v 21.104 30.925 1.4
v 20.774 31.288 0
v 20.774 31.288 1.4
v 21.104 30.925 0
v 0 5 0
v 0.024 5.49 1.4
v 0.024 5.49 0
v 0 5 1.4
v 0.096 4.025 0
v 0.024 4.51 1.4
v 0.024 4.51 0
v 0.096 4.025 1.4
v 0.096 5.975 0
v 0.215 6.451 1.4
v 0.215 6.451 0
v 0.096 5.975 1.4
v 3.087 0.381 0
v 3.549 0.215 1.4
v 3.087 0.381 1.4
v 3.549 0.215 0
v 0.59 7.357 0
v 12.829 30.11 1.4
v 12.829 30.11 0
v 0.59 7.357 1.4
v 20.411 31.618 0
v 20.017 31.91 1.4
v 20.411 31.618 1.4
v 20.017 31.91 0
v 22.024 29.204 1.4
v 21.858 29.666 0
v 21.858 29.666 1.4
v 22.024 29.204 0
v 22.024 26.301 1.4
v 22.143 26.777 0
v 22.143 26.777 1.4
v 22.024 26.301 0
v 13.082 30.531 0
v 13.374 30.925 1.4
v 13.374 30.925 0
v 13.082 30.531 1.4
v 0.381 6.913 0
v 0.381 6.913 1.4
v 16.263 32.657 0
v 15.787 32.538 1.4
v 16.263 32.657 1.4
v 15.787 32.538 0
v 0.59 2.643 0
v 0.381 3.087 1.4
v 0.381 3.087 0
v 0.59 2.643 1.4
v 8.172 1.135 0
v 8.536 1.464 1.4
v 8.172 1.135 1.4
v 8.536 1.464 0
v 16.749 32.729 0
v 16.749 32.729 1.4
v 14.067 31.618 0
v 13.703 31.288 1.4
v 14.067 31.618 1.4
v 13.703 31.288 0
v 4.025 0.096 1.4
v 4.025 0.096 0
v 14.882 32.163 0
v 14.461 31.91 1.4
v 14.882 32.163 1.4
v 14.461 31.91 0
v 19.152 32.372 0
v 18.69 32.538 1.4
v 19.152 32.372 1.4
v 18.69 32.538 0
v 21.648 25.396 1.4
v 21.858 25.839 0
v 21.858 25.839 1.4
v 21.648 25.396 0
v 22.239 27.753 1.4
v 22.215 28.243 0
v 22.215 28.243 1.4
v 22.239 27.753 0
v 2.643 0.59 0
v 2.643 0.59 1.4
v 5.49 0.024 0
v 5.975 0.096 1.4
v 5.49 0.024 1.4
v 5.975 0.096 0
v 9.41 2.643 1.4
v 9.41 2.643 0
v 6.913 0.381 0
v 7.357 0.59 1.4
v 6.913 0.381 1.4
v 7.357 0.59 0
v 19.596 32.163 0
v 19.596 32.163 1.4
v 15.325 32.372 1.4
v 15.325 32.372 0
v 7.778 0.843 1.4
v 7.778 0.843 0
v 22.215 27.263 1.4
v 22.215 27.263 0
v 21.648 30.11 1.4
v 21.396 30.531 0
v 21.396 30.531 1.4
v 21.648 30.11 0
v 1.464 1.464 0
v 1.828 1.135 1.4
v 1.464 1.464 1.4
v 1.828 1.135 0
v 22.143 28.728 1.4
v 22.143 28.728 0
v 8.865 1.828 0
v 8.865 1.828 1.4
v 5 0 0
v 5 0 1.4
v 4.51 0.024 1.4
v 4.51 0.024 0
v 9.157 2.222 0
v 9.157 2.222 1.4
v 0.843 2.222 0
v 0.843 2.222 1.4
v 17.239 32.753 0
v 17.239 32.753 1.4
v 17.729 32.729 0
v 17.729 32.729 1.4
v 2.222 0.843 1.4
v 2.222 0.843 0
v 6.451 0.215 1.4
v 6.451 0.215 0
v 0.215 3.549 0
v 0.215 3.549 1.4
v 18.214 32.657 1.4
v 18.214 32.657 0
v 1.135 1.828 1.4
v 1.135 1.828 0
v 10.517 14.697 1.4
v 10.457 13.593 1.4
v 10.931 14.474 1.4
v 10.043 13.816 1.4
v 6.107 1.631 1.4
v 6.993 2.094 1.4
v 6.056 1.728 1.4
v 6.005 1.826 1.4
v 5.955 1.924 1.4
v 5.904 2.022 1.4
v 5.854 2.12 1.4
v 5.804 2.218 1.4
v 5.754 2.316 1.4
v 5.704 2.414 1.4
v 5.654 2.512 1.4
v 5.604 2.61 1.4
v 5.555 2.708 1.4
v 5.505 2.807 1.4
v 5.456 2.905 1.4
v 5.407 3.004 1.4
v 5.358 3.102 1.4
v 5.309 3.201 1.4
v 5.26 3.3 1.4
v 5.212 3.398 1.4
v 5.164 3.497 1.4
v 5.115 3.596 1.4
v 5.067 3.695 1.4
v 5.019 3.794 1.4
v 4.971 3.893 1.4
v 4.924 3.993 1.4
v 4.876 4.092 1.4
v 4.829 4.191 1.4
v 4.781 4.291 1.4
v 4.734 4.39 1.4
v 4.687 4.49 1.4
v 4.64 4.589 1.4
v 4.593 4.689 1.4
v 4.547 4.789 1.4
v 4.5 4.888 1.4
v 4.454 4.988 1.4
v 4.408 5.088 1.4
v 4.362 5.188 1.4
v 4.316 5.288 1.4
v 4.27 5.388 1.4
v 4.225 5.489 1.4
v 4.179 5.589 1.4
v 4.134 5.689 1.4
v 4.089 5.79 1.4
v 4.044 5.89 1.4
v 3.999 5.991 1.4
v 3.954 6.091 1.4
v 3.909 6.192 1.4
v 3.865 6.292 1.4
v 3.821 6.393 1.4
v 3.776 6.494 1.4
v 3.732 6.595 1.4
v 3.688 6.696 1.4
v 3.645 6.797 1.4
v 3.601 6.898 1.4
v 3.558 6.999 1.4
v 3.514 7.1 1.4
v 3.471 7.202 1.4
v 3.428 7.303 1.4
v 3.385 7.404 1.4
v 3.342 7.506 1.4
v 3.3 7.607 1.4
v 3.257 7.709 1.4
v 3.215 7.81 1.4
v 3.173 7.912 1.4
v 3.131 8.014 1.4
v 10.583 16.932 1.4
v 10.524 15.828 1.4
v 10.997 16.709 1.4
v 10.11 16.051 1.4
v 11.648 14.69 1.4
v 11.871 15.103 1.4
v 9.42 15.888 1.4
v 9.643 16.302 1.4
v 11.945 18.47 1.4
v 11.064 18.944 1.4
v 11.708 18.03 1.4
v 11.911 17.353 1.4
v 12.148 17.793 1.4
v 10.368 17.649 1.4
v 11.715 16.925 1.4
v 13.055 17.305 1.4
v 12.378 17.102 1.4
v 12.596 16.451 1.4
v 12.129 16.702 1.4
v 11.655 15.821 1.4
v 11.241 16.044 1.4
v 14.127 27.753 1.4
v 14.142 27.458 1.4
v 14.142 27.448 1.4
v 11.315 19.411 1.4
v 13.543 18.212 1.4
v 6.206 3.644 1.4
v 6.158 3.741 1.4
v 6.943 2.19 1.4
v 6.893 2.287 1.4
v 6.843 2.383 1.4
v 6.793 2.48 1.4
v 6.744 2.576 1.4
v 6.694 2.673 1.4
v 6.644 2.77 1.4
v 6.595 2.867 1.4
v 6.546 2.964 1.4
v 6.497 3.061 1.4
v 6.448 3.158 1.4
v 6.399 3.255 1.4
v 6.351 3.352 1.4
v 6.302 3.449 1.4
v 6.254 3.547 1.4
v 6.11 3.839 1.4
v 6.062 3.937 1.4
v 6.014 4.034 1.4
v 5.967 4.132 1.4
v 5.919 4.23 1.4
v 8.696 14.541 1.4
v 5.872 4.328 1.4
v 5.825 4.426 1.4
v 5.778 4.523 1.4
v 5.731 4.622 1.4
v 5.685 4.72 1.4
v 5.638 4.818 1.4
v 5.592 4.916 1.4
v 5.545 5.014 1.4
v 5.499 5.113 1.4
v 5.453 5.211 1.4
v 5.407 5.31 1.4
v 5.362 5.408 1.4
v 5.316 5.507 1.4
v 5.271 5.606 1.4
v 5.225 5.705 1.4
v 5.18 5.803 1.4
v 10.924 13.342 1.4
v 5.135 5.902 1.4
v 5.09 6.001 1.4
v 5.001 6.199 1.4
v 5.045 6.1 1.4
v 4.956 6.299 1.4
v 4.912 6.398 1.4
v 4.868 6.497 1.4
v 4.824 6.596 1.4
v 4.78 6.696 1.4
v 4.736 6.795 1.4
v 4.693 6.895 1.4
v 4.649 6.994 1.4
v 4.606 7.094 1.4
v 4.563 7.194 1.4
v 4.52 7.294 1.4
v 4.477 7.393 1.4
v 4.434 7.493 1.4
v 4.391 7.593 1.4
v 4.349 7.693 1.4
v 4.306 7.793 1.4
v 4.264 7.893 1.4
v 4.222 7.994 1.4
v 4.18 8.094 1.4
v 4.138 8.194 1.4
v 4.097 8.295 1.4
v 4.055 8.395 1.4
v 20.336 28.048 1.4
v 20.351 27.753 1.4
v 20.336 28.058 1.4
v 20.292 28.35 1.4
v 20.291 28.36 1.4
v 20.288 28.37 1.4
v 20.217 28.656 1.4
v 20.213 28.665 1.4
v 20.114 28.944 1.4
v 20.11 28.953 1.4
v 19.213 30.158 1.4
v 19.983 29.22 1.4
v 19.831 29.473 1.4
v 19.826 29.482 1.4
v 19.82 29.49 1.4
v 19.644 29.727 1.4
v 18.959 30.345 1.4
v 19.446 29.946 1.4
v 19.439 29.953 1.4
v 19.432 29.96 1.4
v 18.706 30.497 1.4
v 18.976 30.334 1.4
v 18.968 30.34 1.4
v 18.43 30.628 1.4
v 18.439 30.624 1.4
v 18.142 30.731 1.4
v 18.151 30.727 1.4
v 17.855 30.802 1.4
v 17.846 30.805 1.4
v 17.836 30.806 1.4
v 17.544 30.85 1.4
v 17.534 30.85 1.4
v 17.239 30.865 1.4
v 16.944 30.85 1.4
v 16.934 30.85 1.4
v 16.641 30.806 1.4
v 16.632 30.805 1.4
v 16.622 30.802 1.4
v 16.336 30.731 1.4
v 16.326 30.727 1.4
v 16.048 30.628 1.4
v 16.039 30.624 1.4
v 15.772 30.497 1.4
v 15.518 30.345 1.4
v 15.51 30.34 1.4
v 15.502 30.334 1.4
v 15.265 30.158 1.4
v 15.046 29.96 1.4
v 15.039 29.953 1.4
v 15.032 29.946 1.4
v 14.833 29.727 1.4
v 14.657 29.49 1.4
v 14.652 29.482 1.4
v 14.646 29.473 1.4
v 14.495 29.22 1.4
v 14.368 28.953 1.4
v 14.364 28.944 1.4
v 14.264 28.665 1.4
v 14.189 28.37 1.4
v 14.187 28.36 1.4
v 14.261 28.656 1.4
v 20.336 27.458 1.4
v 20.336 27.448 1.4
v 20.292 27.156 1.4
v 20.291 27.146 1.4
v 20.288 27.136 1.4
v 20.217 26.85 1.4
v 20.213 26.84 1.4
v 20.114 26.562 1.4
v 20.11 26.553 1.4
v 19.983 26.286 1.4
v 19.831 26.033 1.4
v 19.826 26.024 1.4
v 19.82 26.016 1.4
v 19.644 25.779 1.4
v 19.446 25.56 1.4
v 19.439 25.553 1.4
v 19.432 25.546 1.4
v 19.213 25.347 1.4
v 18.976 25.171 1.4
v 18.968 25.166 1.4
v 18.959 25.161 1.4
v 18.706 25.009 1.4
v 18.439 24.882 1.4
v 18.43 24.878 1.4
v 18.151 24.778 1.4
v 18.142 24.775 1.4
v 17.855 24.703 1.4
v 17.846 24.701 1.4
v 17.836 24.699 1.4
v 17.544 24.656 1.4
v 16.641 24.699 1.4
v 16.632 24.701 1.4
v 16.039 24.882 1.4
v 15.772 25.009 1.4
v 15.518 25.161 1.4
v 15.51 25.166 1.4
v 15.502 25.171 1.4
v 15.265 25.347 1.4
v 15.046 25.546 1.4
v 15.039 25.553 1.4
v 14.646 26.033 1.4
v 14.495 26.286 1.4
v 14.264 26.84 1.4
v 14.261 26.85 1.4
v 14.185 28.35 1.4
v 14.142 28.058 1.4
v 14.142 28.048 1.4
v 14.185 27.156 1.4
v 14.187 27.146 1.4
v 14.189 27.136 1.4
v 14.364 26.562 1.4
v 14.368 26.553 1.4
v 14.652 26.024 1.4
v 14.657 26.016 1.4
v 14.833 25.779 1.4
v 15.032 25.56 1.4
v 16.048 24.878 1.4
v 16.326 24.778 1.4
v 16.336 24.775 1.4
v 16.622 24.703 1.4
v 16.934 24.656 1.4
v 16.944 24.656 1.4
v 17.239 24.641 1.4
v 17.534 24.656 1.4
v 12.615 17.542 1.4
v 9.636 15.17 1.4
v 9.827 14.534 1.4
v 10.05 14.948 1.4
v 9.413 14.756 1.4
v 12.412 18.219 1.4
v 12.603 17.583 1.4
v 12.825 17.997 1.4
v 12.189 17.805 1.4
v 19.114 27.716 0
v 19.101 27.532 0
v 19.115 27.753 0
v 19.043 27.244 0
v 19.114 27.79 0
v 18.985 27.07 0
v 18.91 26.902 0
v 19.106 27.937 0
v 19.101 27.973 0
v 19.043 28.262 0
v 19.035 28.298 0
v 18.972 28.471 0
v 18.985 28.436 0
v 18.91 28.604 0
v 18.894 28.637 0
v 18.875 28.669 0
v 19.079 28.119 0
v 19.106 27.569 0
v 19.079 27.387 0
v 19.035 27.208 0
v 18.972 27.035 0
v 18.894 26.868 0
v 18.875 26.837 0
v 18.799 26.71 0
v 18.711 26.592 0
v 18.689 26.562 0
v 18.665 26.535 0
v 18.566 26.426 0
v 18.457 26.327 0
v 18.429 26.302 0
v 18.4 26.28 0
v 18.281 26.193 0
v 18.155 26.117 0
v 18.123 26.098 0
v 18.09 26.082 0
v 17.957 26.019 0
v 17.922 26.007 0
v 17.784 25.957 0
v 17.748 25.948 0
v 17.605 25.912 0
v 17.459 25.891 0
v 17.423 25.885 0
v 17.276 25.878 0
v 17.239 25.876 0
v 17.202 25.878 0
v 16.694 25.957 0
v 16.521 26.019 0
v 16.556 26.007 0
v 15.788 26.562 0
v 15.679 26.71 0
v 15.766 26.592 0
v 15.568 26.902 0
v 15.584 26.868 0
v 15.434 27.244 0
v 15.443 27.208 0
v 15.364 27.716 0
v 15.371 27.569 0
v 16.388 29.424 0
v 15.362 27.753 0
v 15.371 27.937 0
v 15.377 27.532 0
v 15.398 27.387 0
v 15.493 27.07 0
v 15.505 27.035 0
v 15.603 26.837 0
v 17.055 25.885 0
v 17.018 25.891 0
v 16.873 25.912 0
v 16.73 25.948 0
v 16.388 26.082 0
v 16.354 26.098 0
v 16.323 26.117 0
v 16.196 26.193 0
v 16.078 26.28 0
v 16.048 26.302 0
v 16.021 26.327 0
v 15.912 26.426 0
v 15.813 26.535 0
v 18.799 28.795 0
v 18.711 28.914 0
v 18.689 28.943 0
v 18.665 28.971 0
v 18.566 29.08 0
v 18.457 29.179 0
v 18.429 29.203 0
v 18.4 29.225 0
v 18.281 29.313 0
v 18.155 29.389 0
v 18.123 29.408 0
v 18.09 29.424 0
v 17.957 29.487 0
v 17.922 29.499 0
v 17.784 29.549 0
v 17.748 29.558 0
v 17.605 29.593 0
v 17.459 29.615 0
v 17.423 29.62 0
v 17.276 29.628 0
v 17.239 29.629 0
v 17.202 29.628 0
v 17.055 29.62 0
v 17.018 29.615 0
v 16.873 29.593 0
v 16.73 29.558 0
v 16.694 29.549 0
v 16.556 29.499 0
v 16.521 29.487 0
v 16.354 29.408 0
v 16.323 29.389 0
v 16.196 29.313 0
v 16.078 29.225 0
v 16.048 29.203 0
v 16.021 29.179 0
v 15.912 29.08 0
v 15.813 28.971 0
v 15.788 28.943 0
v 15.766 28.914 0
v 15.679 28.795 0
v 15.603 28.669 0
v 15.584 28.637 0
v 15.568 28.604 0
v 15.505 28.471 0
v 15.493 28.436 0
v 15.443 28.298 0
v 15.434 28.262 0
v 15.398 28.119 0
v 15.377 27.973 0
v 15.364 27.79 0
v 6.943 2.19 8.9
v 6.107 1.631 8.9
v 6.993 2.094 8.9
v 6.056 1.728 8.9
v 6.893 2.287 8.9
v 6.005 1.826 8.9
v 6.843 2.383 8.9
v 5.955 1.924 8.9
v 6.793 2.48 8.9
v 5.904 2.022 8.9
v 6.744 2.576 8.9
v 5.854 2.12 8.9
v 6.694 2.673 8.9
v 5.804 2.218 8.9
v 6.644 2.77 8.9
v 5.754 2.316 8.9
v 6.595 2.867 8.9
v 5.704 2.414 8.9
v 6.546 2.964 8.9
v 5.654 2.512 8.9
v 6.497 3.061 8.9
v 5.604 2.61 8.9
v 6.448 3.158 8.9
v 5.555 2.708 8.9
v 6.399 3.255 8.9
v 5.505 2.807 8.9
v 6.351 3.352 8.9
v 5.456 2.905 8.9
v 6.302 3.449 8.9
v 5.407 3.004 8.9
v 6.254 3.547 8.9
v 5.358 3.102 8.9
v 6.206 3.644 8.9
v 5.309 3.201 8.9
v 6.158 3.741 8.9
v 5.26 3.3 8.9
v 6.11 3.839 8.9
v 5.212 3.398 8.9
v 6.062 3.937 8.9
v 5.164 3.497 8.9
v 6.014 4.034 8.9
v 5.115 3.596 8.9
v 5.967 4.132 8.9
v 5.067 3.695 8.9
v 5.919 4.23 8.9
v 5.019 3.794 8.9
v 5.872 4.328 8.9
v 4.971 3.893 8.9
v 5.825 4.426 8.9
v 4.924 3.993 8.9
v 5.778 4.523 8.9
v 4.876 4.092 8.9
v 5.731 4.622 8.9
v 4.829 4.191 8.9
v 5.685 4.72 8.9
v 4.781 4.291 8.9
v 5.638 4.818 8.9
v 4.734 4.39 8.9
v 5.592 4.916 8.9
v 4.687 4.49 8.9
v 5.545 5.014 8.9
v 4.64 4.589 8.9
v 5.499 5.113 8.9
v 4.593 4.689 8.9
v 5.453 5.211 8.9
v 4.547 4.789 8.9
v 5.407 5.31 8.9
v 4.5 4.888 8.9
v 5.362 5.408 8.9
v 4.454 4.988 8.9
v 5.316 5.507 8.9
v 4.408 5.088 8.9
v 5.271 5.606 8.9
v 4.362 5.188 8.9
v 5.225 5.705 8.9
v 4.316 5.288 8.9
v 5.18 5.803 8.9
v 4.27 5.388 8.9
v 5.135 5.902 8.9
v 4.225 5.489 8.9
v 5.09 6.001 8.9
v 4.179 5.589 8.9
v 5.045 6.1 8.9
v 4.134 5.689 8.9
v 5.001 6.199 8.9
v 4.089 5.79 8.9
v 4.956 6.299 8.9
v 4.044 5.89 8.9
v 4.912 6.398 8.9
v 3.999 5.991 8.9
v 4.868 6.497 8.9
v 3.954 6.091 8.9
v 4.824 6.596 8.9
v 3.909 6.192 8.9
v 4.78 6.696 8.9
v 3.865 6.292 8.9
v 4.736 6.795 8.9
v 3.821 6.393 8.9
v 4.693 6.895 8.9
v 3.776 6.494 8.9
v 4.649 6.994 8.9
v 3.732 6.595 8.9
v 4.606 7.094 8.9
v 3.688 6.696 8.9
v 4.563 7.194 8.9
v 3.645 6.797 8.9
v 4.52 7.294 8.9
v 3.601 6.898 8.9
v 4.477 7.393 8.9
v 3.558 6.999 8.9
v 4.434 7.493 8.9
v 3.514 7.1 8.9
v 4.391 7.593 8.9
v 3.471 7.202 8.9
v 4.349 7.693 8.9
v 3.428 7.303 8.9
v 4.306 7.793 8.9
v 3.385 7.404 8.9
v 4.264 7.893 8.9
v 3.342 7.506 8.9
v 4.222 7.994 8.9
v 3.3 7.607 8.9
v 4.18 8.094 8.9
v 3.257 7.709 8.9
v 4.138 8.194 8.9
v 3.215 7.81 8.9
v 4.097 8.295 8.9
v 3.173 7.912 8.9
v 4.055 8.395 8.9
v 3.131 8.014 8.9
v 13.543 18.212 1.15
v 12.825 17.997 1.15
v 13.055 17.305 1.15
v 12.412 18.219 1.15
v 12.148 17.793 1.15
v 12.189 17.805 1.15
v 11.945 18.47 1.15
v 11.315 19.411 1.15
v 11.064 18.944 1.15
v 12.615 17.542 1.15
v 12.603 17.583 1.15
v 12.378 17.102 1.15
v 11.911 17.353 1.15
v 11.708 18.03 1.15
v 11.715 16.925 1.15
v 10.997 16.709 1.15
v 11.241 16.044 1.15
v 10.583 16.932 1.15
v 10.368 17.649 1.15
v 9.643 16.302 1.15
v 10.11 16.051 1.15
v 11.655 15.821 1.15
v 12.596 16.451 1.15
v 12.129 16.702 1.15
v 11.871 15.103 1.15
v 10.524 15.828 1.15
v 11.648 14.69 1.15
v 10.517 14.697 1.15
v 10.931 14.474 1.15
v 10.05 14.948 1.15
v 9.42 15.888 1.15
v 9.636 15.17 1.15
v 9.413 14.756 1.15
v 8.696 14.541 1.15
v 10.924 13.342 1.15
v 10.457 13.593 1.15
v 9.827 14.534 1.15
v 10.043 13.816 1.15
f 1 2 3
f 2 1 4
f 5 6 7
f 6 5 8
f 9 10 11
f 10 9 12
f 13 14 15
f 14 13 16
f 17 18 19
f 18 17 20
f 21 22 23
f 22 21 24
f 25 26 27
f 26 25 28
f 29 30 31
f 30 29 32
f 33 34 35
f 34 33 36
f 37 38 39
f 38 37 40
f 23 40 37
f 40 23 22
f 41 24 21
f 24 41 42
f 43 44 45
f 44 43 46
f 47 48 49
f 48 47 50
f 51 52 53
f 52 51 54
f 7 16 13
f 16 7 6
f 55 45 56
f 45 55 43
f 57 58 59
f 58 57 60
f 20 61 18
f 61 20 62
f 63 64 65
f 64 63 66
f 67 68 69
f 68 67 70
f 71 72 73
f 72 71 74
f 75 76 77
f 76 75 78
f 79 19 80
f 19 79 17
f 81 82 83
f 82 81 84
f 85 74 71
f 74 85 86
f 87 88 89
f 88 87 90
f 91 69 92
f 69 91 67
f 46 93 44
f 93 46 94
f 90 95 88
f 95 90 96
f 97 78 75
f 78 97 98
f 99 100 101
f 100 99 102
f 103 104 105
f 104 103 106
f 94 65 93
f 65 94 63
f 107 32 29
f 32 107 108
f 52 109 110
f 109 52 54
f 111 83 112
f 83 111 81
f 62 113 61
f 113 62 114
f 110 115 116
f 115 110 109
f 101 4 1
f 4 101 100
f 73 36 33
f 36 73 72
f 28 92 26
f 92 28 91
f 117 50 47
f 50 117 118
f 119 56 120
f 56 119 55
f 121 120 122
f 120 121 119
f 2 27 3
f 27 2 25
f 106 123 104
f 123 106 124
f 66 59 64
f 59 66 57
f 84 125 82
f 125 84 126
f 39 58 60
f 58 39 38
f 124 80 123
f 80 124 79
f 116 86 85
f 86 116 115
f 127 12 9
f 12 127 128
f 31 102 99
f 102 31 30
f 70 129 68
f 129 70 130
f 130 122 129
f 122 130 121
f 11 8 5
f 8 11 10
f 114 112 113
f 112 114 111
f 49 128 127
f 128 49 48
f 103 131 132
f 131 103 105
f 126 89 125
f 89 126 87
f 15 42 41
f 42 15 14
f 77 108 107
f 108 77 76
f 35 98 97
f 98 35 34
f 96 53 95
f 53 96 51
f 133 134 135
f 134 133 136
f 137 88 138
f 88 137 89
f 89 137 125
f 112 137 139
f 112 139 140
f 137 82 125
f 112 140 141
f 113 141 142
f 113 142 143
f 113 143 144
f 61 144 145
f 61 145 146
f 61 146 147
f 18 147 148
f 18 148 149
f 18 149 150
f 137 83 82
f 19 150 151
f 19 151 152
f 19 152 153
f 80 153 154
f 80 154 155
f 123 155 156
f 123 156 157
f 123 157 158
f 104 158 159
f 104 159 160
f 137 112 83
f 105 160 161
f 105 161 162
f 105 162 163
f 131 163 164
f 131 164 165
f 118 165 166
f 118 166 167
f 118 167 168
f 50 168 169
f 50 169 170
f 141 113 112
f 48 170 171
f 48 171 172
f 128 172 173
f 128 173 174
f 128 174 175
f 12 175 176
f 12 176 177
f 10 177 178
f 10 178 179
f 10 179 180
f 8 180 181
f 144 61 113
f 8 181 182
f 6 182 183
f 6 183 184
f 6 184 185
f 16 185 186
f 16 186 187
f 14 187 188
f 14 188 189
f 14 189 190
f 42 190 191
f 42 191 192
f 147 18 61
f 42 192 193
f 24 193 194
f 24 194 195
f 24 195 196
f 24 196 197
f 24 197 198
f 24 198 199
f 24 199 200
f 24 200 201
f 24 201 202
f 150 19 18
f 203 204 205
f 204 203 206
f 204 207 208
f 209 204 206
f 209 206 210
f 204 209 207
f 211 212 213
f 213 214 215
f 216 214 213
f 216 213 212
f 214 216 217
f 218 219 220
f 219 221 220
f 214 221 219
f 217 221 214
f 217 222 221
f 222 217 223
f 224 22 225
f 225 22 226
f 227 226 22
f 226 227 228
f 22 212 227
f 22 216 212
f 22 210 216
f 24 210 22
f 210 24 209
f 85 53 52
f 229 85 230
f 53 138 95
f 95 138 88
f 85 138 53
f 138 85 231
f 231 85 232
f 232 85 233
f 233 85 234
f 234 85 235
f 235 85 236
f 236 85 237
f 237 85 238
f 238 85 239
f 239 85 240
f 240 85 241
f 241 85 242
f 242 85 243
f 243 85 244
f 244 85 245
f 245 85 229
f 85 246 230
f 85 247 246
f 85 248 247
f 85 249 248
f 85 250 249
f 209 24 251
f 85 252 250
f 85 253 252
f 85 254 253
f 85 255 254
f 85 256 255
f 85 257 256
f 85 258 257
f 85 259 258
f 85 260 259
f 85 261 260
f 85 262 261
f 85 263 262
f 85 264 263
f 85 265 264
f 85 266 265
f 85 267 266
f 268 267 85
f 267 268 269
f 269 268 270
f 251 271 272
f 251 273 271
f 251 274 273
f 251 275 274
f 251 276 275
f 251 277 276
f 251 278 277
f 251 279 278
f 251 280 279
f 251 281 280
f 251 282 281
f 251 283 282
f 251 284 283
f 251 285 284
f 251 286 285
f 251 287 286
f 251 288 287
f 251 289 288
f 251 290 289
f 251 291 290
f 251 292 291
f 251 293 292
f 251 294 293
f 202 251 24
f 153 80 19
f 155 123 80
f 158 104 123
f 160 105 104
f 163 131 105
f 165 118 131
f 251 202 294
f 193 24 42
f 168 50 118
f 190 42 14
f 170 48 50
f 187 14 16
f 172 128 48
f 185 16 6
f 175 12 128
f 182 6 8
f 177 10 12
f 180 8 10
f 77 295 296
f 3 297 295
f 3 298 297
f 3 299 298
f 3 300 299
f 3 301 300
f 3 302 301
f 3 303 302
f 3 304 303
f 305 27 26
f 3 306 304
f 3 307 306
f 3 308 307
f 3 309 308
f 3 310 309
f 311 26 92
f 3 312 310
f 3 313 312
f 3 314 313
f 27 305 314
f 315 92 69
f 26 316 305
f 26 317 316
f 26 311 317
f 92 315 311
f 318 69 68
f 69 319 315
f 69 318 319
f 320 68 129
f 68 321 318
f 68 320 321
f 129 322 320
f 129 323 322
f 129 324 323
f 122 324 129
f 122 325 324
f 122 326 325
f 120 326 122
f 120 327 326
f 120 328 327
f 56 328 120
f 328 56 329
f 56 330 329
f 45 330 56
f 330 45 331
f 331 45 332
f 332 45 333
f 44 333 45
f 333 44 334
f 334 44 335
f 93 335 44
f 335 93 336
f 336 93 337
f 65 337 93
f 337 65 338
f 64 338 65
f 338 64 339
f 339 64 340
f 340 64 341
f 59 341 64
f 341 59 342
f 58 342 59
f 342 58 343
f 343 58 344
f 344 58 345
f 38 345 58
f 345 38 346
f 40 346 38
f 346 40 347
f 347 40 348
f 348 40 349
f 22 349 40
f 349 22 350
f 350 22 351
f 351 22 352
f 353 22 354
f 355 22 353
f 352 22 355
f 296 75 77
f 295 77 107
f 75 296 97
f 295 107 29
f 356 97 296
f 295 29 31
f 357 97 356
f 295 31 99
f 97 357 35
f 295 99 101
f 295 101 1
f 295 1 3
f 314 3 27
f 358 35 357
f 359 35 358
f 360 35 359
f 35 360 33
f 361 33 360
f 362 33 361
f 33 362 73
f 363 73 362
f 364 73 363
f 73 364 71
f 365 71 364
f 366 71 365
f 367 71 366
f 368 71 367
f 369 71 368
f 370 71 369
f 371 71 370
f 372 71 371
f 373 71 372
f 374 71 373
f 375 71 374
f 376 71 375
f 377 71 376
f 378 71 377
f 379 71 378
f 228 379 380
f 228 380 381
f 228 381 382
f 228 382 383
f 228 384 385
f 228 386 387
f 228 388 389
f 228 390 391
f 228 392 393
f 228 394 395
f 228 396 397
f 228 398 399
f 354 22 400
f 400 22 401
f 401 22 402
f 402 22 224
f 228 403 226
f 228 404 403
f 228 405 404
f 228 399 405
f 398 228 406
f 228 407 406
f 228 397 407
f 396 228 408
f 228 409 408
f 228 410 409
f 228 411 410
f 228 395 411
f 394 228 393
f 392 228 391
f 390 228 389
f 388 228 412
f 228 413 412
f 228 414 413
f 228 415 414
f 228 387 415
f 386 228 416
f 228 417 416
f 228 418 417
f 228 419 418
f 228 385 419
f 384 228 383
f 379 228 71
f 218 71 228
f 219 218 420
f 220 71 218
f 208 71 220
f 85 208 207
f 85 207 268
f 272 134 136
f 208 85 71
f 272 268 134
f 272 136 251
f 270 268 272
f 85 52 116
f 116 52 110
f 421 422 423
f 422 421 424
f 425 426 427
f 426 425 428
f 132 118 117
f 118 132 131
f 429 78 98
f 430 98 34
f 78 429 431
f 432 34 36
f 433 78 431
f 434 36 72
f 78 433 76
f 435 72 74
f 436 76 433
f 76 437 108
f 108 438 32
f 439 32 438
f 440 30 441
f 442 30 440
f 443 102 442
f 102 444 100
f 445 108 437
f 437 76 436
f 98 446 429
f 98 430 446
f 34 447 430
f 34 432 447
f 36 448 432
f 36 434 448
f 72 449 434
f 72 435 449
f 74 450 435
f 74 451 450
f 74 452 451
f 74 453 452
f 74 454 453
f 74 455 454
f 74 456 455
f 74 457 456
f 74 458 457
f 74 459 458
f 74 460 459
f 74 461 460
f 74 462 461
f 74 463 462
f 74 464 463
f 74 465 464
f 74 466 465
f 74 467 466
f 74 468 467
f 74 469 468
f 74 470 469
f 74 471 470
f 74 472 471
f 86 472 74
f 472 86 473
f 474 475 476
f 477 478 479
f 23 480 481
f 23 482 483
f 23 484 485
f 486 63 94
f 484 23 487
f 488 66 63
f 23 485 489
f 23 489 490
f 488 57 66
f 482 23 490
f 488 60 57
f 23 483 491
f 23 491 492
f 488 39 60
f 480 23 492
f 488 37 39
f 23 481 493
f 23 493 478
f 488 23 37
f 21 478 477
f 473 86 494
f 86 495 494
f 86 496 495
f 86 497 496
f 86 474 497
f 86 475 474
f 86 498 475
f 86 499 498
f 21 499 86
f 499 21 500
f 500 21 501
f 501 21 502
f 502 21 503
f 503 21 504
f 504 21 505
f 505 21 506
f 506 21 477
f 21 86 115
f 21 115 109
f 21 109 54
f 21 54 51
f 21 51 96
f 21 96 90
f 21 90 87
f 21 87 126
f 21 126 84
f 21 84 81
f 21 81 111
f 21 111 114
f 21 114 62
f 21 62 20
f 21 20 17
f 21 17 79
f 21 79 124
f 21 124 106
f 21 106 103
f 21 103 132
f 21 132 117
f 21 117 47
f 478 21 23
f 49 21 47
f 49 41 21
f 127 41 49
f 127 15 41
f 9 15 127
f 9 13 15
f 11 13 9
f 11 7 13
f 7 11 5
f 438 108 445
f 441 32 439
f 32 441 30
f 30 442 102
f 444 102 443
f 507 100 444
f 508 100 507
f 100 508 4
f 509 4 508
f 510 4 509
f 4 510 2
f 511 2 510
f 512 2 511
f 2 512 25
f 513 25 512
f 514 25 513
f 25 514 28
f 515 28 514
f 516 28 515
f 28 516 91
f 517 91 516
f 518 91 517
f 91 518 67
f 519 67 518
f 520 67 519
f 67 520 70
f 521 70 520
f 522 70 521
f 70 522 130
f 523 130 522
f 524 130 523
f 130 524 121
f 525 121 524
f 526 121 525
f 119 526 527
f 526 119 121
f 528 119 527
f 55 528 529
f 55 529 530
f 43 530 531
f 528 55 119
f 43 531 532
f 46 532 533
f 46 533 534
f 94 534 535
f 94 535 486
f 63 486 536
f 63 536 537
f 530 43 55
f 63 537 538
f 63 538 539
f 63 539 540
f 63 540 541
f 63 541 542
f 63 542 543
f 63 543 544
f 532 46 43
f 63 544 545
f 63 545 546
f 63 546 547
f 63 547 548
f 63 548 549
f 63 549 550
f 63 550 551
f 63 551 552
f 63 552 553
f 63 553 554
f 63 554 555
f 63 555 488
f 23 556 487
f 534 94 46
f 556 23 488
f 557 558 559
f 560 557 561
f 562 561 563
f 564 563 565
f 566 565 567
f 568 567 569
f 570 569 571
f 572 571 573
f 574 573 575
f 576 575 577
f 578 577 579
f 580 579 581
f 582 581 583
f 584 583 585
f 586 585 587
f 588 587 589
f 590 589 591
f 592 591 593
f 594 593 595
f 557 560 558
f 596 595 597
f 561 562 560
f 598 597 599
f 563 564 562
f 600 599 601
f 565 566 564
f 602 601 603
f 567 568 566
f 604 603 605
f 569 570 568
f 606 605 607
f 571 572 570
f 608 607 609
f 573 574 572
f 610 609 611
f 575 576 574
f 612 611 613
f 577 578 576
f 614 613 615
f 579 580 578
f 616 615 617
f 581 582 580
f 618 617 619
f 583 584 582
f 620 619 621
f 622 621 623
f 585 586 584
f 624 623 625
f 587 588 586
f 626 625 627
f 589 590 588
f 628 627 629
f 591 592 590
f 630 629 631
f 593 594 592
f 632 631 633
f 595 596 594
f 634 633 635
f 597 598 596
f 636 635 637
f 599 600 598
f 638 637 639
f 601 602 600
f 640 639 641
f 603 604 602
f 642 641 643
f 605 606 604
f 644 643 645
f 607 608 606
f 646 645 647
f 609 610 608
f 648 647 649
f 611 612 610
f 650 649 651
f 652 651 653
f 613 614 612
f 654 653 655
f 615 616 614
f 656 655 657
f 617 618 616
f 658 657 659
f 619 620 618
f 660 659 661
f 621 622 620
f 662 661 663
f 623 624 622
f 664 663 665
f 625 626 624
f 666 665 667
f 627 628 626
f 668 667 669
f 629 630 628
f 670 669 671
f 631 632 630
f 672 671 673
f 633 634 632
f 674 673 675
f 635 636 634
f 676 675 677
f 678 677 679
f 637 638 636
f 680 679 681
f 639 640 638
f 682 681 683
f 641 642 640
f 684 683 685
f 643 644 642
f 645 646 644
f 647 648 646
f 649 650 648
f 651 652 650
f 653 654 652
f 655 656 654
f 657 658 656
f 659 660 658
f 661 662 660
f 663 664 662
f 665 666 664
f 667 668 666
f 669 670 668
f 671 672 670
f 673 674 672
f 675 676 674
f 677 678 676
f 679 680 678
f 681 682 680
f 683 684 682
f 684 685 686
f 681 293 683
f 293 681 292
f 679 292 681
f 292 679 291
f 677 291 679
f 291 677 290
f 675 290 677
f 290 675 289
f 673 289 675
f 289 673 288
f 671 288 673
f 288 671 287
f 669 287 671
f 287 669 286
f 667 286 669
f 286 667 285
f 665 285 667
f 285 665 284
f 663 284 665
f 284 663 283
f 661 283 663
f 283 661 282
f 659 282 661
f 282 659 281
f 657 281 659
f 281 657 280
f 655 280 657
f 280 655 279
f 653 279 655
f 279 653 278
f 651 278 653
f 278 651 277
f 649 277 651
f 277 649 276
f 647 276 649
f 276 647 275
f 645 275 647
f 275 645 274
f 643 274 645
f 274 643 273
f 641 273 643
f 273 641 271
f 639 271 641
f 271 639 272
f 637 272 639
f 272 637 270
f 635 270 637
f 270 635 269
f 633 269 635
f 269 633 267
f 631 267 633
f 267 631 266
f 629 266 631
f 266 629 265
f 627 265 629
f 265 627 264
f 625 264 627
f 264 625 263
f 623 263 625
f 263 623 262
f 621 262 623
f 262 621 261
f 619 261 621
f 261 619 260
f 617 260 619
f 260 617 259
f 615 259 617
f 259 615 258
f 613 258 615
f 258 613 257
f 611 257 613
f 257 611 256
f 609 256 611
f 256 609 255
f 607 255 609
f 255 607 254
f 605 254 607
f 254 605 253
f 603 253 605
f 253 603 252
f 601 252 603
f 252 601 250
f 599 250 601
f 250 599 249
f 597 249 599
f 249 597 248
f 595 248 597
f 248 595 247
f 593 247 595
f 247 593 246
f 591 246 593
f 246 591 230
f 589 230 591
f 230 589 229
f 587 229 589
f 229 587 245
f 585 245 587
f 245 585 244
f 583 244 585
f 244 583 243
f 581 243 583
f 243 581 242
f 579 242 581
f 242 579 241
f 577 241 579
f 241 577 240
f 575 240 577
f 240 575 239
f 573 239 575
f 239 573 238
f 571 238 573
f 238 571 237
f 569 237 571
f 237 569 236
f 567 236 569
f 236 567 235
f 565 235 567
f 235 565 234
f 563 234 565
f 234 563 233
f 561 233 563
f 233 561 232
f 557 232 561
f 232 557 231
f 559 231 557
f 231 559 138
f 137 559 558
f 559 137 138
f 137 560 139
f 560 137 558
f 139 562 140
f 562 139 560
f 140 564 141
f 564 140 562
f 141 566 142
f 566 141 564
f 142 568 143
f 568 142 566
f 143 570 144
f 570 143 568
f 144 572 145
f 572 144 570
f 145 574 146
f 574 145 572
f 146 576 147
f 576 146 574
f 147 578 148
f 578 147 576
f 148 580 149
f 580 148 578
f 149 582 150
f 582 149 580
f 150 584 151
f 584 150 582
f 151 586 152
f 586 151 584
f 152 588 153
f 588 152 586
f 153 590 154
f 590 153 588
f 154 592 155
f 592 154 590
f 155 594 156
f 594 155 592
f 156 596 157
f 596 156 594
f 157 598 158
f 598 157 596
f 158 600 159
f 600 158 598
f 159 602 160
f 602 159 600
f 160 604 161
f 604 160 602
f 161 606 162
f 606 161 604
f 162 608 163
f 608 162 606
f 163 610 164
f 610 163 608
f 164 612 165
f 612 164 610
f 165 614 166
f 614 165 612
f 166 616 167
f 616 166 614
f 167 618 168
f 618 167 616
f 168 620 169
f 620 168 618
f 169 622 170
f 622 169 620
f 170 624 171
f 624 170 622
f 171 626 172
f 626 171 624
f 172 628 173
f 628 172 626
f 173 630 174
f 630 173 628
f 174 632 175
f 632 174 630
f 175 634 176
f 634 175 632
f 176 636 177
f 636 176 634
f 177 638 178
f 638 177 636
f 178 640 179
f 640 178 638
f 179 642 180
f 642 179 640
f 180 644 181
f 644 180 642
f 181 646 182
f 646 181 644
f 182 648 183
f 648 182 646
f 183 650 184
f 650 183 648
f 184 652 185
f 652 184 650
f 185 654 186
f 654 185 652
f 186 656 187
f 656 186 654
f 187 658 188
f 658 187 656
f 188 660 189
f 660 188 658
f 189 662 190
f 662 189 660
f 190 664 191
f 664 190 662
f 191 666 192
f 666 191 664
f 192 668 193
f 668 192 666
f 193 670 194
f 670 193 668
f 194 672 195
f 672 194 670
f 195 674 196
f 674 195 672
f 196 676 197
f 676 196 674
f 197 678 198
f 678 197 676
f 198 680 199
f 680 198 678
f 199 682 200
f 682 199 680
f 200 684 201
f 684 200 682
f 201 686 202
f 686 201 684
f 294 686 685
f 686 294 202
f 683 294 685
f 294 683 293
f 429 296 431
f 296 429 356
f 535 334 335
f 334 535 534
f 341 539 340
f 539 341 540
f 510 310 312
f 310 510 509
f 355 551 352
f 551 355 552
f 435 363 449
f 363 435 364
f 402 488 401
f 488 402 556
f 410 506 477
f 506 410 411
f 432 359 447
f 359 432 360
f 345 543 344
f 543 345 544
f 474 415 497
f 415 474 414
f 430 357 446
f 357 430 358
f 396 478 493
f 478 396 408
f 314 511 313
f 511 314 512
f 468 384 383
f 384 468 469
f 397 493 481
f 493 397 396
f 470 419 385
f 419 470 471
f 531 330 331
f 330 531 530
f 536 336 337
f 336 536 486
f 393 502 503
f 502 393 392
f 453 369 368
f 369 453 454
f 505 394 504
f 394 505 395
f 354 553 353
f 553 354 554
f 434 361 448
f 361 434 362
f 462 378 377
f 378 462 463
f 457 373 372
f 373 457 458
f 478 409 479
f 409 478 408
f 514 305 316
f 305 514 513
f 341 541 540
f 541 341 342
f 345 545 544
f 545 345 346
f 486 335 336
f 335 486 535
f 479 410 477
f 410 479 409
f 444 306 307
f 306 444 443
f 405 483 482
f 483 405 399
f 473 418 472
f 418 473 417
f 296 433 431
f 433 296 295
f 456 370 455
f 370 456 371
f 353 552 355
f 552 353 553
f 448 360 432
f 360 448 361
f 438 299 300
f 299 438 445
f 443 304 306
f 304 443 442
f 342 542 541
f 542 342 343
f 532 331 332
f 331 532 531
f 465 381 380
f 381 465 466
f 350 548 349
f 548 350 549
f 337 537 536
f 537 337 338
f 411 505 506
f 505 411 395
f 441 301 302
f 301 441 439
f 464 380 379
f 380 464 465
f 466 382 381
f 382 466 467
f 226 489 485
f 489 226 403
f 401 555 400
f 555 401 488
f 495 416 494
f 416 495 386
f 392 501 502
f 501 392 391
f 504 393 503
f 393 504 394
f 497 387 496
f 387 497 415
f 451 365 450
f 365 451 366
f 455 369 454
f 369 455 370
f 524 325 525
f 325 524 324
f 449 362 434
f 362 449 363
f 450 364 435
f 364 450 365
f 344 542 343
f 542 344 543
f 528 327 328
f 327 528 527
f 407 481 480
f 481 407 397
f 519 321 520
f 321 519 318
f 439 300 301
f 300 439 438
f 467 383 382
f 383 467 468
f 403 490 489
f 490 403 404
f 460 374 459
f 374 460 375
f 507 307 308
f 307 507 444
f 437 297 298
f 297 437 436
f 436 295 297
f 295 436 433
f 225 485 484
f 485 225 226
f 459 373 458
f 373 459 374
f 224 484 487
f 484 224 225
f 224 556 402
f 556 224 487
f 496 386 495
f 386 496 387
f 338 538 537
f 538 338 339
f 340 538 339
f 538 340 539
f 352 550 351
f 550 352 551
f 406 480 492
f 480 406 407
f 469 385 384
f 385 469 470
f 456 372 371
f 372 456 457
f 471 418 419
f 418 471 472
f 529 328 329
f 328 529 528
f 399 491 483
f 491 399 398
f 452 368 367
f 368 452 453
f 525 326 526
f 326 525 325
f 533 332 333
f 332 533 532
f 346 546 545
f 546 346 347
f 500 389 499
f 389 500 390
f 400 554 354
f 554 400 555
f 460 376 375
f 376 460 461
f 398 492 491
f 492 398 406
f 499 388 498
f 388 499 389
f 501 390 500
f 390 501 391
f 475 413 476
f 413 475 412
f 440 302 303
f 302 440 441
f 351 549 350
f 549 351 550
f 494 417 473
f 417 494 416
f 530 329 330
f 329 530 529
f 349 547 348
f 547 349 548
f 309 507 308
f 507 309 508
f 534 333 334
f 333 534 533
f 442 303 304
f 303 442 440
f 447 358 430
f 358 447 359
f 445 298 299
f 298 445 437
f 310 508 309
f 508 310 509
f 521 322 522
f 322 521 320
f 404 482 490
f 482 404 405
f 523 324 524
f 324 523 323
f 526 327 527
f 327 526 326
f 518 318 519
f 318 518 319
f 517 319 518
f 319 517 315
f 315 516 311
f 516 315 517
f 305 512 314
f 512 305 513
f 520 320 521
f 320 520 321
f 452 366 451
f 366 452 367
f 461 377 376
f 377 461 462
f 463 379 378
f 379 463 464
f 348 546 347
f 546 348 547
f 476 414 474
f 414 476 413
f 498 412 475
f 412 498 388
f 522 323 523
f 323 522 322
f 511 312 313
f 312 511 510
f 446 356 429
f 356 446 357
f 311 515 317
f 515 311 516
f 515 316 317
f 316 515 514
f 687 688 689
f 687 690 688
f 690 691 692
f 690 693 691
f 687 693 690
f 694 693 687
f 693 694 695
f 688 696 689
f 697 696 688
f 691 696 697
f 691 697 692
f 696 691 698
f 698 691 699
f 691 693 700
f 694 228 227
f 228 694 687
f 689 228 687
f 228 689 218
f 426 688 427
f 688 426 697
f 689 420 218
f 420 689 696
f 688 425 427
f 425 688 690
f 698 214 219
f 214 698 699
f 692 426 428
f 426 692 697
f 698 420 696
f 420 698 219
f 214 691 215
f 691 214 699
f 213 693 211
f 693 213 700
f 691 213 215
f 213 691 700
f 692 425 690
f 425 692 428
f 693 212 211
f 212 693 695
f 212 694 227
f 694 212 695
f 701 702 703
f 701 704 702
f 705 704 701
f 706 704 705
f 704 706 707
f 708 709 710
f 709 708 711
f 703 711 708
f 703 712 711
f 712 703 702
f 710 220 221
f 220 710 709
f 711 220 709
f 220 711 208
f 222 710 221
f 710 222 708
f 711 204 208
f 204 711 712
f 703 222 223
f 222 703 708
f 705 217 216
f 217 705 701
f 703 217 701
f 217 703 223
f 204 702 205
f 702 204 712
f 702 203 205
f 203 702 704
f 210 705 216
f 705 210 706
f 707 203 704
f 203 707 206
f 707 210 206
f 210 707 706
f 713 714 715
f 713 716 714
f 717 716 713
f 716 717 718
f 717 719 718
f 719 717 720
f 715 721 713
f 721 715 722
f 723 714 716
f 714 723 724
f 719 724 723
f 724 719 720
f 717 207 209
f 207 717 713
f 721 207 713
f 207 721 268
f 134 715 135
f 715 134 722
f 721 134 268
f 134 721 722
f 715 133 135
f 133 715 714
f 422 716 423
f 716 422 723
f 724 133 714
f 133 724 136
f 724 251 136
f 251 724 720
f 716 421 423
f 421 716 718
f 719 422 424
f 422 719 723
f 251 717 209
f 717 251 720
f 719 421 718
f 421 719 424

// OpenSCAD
// 同心圓弧歸零光電遮光片
$fn=64;
translate([75.23885,37.75291,42]){rotate([180,0,0]){difference(){difference(){difference(){union(){hull(){translate([-58,10,40.6]){cylinder(h=1.4,d1=10,d2=10,$fn=64);}translate([-70.23885,32.75292,40.6]){cylinder(h=1.4,d1=10,d2=10,$fn=64);}}translate([0,0,33.1]){linear_extrude(height=8.9)polygon([[-69.13173,36.12207],[-69.18264,36.02447],[-69.23341,35.9268],[-69.28405,35.82905],[-69.33454,35.73124],[-69.3849,35.63335],[-69.43512,35.53539],[-69.4852,35.43737],[-69.53514,35.33927],[-69.58495,35.2411],[-69.63461,35.14286],[-69.68414,35.04455],[-69.73353,34.94617],[-69.78278,34.84772],[-69.83189,34.7492],[-69.88086,34.65061],[-69.9297,34.55196],[-69.97839,34.45323],[-70.02694,34.35444],[-70.07536,34.25557],[-70.12363,34.15664],[-70.17177,34.05764],[-70.21976,33.95858],[-70.26762,33.85944],[-70.31533,33.76024],[-70.36291,33.66097],[-70.41034,33.56164],[-70.45764,33.46223],[-70.50479,33.36276],[-70.55181,33.26323],[-70.59868,33.16363],[-70.64541,33.06396],[-70.69201,32.96422],[-70.73846,32.86442],[-70.78477,32.76456],[-70.83094,32.66463],[-70.87697,32.56463],[-70.92286,32.46457],[-70.9686,32.36445],[-71.01421,32.26426],[-71.05967,32.164],[-71.10499,32.06369],[-71.15017,31.96331],[-71.19521,31.86286],[-71.24011,31.76235],[-71.28486,31.66178],[-71.32948,31.56114],[-71.37395,31.46045],[-71.41828,31.35969],[-71.46246,31.25886],[-71.50651,31.15798],[-71.55041,31.05703],[-71.59417,30.95602],[-71.63778,30.85495],[-71.68126,30.75382],[-71.72459,30.65262],[-71.76778,30.55137],[-71.81082,30.45005],[-71.85373,30.34868],[-71.89648,30.24724],[-71.9391,30.14574],[-71.98157,30.04419],[-72.0239,29.94257],[-72.06609,29.84089],[-72.10813,29.73916],[-71.18367,29.35789],[-71.14216,29.45832],[-71.10052,29.55869],[-71.05873,29.659],[-71.0168,29.75926],[-70.97473,29.85945],[-70.93252,29.95959],[-70.89017,30.05967],[-70.84768,30.15968],[-70.80504,30.25964],[-70.76227,30.35954],[-70.71935,30.45937],[-70.67629,30.55915],[-70.6331,30.65886],[-70.58976,30.75852],[-70.54628,30.85811],[-70.50266,30.95764],[-70.4589,31.05711],[-70.415,31.15651],[-70.37095,31.25586],[-70.32677,31.35514],[-70.28245,31.45436],[-70.23799,31.55352],[-70.19339,31.65261],[-70.14865,31.75165],[-70.10377,31.85061],[-70.05875,31.94952],[-70.01359,32.04836],[-69.96829,32.14714],[-69.92285,32.24585],[-69.87727,32.3445],[-69.83156,32.44309],[-69.7857,32.54161],[-69.7397,32.64006],[-69.69357,32.73845],[-69.6473,32.83678],[-69.60089,32.93504],[-69.55434,33.03323],[-69.50765,33.13136],[-69.46082,33.22942],[-69.41385,33.32742],[-69.36675,33.42535],[-69.31951,33.52321],[-69.27213,33.62101],[-69.22461,33.71874],[-69.17695,33.8164],[-69.12916,33.914],[-69.08123,34.01152],[-69.03316,34.10898],[-68.98495,34.20637],[-68.93661,34.3037],[-68.88813,34.40095],[-68.83951,34.49814],[-68.79076,34.59526],[-68.74186,34.69231],[-68.69283,34.78929],[-68.64367,34.8862],[-68.59437,34.98304],[-68.54493,35.07981],[-68.49535,35.17651],[-68.44564,35.27315],[-68.39579,35.36971],[-68.3458,35.4662],[-68.29568,35.56262],[-68.24542,35.65897]]);}}translate([-58,10,39]){cylinder(h=7,d1=3.4,d2=3.4,$fn=64);}}translate([-58,10,40.5]){cylinder(h=1.7,d1=6.4,d2=3.4,$fn=64);}}multmatrix([[-0.47372,0.88068,0,-64.11943],[0.88068,0.47372,0,21.37646],[0,0,-1,40.6],[0,0,0,1]]){union(){union(){union(){union(){union(){union(){union(){union(){union(){union(){union(){union(){union(){union(){union(){union(){union(){union(){union(){union(){union(){union(){union(){union(){union(){union(){union(){union(){union(){union(){translate([-2.765,0.735,-0.25]){cube([0.53,0.53,0.37]);}translate([-2.265,0.735,-0.25]){cube([0.53,0.53,0.37]);}}translate([-2.765,0.235,-0.25]){cube([0.53,0.53,0.37]);}}translate([-1.765,0.235,-0.25]){cube([0.53,0.53,0.37]);}}translate([-2.765,-0.265,-0.25]){cube([0.53,0.53,0.37]);}}translate([-2.265,-0.265,-0.25]){cube([0.53,0.53,0.37]);}}translate([-2.765,-0.765,-0.25]){cube([0.53,0.53,0.37]);}}translate([-2.765,-1.265,-0.25]){cube([0.53,0.53,0.37]);}}translate([-0.765,0.735,-0.25]){cube([0.53,0.53,0.37]);}}translate([-0.265,0.735,-0.25]){cube([0.53,0.53,0.37]);}}translate([0.235,0.735,-0.25]){cube([0.53,0.53,0.37]);}}translate([0.235,0.235,-0.25]){cube([0.53,0.53,0.37]);}}translate([-0.765,-0.265,-0.25]){cube([0.53,0.53,0.37]);}}translate([-0.265,-0.265,-0.25]){cube([0.53,0.53,0.37]);}}translate([0.235,-0.265,-0.25]){cube([0.53,0.53,0.37]);}}translate([-0.765,-0.765,-0.25]){cube([0.53,0.53,0.37]);}}translate([-0.765,-1.265,-0.25]){cube([0.53,0.53,0.37]);}}translate([-0.265,-1.265,-0.25]){cube([0.53,0.53,0.37]);}}translate([0.235,-1.265,-0.25]){cube([0.53,0.53,0.37]);}}translate([1.235,0.735,-0.25]){cube([0.53,0.53,0.37]);}}translate([1.735,0.735,-0.25]){cube([0.53,0.53,0.37]);}}translate([2.235,0.735,-0.25]){cube([0.53,0.53,0.37]);}}translate([1.235,0.235,-0.25]){cube([0.53,0.53,0.37]);}}translate([1.235,-0.265,-0.25]){cube([0.53,0.53,0.37]);}}translate([1.735,-0.265,-0.25]){cube([0.53,0.53,0.37]);}}translate([2.235,-0.265,-0.25]){cube([0.53,0.53,0.37]);}}translate([1.235,-0.765,-0.25]){cube([0.53,0.53,0.37]);}}translate([2.235,-0.765,-0.25]){cube([0.53,0.53,0.37]);}}translate([1.235,-1.265,-0.25]){cube([0.53,0.53,0.37]);}}translate([1.735,-1.265,-0.25]){cube([0.53,0.53,0.37]);}}translate([2.235,-1.265,-0.25]){cube([0.53,0.53,0.37]);}}}}}}
